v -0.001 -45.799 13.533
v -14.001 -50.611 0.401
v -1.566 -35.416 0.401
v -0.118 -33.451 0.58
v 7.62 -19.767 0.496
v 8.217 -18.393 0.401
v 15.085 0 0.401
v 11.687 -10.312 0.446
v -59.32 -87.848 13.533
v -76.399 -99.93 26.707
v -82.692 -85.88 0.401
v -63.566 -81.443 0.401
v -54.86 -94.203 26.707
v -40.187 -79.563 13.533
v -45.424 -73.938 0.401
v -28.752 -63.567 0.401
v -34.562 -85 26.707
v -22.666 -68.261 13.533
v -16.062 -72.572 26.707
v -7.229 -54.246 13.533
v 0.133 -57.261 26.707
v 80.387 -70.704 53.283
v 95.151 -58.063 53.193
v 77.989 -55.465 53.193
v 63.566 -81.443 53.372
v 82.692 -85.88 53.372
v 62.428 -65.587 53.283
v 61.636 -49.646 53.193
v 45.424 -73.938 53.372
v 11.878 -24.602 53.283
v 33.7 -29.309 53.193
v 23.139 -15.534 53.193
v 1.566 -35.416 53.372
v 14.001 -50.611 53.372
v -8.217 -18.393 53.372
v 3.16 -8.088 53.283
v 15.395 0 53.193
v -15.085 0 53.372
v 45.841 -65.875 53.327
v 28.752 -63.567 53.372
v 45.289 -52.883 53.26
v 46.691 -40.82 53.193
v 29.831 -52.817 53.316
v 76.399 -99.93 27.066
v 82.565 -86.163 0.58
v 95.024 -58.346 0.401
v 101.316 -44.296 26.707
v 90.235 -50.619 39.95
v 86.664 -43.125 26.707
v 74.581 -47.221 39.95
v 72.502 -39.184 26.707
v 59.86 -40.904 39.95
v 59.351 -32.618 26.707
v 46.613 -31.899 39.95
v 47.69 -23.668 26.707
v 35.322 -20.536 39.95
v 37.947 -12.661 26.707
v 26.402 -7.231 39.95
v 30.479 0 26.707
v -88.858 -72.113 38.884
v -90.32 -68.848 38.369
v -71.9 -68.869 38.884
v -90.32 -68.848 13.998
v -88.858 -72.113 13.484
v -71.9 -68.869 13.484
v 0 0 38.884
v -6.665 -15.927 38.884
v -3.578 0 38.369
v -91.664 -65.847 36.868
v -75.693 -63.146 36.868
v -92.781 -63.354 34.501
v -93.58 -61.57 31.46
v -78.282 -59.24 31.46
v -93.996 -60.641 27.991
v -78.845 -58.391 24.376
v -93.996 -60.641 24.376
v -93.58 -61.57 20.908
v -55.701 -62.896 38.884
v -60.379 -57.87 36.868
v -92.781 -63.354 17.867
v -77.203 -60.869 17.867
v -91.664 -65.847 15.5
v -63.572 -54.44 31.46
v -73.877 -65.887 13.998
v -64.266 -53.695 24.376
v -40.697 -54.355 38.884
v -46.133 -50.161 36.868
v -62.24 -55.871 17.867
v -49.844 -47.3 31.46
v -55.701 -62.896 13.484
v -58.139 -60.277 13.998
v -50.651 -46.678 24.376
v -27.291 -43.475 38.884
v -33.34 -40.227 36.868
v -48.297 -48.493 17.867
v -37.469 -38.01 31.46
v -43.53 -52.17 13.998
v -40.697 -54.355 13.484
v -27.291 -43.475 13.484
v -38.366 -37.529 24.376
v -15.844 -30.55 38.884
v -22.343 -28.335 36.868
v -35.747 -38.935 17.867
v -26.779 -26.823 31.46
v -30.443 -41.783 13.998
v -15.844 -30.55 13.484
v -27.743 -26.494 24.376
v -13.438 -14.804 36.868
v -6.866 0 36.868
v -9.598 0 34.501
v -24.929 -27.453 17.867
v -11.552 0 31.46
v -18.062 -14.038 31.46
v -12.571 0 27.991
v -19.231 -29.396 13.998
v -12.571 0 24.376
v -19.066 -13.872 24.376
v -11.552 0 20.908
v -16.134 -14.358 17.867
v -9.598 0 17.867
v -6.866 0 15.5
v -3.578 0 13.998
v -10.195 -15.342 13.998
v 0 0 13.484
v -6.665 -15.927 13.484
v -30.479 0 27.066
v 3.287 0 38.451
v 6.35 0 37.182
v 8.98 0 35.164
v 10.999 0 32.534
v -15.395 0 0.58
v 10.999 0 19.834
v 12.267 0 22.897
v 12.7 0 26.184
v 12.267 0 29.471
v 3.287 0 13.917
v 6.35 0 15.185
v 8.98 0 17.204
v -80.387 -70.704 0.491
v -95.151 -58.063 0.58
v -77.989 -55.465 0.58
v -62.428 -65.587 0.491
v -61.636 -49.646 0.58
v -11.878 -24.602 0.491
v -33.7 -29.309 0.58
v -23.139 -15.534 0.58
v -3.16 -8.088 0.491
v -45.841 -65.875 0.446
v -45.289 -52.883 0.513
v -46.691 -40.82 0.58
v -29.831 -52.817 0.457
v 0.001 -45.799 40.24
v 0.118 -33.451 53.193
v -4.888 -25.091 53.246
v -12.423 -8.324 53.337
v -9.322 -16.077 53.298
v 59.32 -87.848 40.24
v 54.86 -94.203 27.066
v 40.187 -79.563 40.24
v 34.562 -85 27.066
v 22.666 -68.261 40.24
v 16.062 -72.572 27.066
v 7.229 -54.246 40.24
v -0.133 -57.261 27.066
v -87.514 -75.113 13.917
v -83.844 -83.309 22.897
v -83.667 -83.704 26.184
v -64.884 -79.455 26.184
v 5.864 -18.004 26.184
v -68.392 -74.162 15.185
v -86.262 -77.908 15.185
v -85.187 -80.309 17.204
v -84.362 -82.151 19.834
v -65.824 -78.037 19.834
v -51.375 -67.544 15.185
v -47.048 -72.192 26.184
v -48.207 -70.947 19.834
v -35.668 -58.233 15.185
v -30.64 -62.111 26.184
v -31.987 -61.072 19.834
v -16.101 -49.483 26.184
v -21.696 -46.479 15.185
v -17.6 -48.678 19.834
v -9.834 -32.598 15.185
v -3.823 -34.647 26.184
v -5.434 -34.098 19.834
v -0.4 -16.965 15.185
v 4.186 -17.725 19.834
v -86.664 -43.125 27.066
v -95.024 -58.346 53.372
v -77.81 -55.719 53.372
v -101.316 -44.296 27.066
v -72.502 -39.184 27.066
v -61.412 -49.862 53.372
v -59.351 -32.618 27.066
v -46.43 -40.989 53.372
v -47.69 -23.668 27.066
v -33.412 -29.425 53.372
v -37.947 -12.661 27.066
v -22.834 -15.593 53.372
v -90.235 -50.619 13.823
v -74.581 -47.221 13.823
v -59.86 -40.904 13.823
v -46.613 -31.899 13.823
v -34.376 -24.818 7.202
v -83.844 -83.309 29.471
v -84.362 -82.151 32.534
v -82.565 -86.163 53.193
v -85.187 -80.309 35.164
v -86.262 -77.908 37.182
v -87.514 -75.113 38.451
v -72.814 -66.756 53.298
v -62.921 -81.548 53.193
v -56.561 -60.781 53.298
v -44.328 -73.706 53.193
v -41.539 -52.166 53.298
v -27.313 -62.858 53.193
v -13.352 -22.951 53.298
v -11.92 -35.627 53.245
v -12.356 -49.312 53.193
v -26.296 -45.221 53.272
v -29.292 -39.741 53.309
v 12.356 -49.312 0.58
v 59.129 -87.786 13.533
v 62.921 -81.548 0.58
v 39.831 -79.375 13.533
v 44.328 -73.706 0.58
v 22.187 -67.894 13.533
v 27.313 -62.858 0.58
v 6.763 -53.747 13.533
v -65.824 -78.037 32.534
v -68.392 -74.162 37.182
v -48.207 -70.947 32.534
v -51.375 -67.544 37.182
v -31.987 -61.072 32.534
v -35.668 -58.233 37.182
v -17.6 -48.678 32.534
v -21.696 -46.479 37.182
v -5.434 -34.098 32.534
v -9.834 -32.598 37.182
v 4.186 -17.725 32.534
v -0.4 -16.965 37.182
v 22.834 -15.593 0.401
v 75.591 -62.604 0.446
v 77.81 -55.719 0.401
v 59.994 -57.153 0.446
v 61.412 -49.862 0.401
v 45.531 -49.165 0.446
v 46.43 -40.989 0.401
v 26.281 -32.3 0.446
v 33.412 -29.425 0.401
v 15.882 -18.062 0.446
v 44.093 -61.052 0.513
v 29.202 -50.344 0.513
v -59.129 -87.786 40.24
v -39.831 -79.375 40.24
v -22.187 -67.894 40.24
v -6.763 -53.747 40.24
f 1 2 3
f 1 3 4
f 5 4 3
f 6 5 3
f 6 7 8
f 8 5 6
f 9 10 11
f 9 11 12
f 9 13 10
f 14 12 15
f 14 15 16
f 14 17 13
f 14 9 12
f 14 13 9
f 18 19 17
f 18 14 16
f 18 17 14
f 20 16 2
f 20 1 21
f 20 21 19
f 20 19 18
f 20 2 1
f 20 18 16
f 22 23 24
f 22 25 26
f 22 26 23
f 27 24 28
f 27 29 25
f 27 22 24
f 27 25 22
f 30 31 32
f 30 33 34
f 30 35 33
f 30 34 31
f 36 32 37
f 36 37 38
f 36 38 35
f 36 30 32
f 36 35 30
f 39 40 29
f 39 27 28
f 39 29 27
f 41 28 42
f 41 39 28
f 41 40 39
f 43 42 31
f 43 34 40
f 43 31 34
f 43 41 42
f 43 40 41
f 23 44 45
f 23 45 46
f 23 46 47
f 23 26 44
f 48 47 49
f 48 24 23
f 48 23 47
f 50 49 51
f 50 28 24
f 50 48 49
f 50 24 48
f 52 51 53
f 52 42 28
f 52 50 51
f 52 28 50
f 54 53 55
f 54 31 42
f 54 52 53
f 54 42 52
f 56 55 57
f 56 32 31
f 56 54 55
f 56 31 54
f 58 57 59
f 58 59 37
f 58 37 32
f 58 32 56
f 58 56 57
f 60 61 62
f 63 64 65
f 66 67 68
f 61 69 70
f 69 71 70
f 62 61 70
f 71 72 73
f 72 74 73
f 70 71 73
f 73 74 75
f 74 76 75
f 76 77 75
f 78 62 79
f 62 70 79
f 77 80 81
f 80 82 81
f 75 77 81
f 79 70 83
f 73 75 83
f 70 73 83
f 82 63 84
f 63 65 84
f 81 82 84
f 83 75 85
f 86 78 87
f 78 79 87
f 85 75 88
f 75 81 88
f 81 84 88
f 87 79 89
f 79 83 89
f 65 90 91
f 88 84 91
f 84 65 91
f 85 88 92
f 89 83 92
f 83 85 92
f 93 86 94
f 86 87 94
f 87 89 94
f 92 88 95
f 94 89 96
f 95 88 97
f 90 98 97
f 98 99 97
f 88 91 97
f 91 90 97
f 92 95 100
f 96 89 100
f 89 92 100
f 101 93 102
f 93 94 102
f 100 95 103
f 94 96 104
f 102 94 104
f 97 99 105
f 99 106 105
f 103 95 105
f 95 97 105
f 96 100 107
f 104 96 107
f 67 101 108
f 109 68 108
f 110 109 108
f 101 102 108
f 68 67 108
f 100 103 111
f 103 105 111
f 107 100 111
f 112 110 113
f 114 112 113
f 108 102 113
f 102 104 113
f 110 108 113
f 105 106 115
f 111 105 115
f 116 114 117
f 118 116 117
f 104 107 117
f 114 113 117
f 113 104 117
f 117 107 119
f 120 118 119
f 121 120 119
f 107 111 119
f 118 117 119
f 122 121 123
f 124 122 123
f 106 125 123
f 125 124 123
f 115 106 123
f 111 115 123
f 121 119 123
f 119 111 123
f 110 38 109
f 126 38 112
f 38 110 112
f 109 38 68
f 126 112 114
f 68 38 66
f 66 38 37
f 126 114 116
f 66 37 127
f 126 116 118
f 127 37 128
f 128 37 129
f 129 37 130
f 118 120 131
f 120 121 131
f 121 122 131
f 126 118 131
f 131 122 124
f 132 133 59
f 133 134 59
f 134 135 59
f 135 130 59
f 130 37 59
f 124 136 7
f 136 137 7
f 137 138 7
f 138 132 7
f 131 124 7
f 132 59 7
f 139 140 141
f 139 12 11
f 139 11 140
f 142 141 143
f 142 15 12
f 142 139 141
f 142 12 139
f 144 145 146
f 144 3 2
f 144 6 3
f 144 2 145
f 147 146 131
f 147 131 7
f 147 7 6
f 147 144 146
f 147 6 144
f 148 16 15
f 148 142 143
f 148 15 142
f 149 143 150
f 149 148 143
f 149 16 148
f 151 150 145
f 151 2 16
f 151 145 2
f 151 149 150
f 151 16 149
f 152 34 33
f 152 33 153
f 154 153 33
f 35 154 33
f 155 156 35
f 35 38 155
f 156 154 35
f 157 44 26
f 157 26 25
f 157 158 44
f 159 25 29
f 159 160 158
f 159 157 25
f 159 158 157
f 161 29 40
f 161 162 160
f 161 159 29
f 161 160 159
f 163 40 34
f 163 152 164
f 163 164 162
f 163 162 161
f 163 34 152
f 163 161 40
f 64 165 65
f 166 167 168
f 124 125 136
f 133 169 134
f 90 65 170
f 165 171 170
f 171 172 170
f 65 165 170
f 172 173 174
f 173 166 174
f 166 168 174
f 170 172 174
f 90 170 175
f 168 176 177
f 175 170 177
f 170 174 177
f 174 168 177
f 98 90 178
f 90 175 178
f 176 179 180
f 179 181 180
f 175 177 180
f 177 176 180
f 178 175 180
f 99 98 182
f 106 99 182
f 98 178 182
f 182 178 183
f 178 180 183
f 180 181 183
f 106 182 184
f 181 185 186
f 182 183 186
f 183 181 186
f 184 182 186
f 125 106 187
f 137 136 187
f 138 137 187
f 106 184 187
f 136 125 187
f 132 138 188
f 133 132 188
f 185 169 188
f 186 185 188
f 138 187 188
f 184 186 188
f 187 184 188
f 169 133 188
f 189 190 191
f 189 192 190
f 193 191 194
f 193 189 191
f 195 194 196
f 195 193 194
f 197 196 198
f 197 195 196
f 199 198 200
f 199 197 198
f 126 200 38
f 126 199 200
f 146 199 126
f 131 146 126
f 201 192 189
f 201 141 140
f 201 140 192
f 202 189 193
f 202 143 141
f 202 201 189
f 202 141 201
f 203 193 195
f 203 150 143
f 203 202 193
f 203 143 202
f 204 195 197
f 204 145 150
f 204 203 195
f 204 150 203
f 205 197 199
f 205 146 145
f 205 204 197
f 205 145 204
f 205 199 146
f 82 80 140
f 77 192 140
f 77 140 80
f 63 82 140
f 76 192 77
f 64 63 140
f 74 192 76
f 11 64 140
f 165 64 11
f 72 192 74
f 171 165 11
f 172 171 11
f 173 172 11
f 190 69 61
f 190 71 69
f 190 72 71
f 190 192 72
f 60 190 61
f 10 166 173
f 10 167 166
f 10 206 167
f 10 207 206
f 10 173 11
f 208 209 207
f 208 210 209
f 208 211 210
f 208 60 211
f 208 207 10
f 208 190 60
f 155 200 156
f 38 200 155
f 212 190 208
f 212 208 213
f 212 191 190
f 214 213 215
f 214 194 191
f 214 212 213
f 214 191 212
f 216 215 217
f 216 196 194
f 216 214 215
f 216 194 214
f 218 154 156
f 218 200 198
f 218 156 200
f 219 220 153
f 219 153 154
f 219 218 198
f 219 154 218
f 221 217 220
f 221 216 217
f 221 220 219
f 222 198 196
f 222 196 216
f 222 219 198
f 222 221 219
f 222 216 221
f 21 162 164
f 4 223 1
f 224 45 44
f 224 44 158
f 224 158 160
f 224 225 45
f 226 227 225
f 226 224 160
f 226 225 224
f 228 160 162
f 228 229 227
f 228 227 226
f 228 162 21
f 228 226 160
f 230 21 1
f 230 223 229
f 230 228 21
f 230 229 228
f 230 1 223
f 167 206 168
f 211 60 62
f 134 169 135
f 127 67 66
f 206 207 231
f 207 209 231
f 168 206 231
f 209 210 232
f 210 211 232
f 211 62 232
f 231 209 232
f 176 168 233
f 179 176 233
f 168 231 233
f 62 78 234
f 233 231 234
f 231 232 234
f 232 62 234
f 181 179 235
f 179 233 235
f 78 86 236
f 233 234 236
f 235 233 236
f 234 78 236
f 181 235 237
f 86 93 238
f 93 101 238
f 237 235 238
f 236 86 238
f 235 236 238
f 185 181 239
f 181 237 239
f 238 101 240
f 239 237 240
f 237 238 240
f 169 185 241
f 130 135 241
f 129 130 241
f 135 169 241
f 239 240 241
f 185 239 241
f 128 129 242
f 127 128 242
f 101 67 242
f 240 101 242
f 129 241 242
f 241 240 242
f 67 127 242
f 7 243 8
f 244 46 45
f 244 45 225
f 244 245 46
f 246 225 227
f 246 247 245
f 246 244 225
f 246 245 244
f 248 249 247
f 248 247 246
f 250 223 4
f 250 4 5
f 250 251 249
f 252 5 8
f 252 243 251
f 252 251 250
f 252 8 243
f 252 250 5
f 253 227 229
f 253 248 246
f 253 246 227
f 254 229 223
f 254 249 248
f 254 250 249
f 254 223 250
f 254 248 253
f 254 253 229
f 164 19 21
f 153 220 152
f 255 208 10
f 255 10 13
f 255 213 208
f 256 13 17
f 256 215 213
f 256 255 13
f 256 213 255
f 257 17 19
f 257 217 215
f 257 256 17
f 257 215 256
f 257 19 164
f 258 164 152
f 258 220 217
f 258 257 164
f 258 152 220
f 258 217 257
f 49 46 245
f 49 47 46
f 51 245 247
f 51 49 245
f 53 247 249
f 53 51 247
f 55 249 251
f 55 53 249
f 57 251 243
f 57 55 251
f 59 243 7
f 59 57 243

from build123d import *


with BuildPart() as f2:
    # F2: sweep along a path in F1
    with BuildLine(Plane.XY) as f2_path:
        ThreePointArc((88.857807219, -72.1131786704), (33.770108767, -49.1903487224), (0, 0))
    # F0 (on Front) → F2 (sweep)
    with BuildSketch(Plane.XZ):
        Polygon((-30.4794730405, 27.0658959038), (-15.3949537232, 0.5802832628), (15.0845193173, 0.401053875), (30.4794730405, 26.7074371281), (15.3949537232, 53.193049769), (-15.0845193173, 53.3722791569), align=None)
    sweep(path=f2_path.line)

    # F3: sweep along a path in F1
    with BuildLine(Plane.XY) as f3_path:
        ThreePointArc((-88.857807219, -72.1131786704), (-33.770108767, -49.1903487224), (0, 0))
    # F0 (on Front) → F3 (sweep)
    with BuildSketch(Plane.XZ):
        Polygon((-30.4794730405, 27.0658959038), (-15.3949537232, 0.5802832628), (15.0845193173, 0.401053875), (30.4794730405, 26.7074371281), (15.3949537232, 53.193049769), (-15.0845193173, 53.3722791569), align=None)
    sweep(path=f3_path.line)

    # F5: sweep along a path in F1
    with BuildLine(Plane.XY) as f5_path:
        ThreePointArc((-88.857807219, -72.1131786704), (-33.770108767, -49.1903487224), (0, 0))
    # F4 (on face) → F5 (sweep, cut)
    with BuildSketch(Plane.XZ):
        with BuildLine():
            Line((0, 38.8838126014), (0, 13.4838126014))
            ThreePointArc((0, 13.4838126014), (8.9802561211, 17.2035564803), (12.7, 26.1838126014))
            ThreePointArc((12.7, 26.1838126014), (8.9802561211, 35.1640687224), (0, 38.8838126014))
        make_face()
        with BuildLine():
            ThreePointArc((0, 38.8838126014), (-12.7, 26.1838126014), (0, 13.4838126014))
            Line((0, 13.4838126014), (0, 38.8838126014))
        make_face()
    sweep(path=f5_path.line, mode=Mode.SUBTRACT)


solid = f2.part
